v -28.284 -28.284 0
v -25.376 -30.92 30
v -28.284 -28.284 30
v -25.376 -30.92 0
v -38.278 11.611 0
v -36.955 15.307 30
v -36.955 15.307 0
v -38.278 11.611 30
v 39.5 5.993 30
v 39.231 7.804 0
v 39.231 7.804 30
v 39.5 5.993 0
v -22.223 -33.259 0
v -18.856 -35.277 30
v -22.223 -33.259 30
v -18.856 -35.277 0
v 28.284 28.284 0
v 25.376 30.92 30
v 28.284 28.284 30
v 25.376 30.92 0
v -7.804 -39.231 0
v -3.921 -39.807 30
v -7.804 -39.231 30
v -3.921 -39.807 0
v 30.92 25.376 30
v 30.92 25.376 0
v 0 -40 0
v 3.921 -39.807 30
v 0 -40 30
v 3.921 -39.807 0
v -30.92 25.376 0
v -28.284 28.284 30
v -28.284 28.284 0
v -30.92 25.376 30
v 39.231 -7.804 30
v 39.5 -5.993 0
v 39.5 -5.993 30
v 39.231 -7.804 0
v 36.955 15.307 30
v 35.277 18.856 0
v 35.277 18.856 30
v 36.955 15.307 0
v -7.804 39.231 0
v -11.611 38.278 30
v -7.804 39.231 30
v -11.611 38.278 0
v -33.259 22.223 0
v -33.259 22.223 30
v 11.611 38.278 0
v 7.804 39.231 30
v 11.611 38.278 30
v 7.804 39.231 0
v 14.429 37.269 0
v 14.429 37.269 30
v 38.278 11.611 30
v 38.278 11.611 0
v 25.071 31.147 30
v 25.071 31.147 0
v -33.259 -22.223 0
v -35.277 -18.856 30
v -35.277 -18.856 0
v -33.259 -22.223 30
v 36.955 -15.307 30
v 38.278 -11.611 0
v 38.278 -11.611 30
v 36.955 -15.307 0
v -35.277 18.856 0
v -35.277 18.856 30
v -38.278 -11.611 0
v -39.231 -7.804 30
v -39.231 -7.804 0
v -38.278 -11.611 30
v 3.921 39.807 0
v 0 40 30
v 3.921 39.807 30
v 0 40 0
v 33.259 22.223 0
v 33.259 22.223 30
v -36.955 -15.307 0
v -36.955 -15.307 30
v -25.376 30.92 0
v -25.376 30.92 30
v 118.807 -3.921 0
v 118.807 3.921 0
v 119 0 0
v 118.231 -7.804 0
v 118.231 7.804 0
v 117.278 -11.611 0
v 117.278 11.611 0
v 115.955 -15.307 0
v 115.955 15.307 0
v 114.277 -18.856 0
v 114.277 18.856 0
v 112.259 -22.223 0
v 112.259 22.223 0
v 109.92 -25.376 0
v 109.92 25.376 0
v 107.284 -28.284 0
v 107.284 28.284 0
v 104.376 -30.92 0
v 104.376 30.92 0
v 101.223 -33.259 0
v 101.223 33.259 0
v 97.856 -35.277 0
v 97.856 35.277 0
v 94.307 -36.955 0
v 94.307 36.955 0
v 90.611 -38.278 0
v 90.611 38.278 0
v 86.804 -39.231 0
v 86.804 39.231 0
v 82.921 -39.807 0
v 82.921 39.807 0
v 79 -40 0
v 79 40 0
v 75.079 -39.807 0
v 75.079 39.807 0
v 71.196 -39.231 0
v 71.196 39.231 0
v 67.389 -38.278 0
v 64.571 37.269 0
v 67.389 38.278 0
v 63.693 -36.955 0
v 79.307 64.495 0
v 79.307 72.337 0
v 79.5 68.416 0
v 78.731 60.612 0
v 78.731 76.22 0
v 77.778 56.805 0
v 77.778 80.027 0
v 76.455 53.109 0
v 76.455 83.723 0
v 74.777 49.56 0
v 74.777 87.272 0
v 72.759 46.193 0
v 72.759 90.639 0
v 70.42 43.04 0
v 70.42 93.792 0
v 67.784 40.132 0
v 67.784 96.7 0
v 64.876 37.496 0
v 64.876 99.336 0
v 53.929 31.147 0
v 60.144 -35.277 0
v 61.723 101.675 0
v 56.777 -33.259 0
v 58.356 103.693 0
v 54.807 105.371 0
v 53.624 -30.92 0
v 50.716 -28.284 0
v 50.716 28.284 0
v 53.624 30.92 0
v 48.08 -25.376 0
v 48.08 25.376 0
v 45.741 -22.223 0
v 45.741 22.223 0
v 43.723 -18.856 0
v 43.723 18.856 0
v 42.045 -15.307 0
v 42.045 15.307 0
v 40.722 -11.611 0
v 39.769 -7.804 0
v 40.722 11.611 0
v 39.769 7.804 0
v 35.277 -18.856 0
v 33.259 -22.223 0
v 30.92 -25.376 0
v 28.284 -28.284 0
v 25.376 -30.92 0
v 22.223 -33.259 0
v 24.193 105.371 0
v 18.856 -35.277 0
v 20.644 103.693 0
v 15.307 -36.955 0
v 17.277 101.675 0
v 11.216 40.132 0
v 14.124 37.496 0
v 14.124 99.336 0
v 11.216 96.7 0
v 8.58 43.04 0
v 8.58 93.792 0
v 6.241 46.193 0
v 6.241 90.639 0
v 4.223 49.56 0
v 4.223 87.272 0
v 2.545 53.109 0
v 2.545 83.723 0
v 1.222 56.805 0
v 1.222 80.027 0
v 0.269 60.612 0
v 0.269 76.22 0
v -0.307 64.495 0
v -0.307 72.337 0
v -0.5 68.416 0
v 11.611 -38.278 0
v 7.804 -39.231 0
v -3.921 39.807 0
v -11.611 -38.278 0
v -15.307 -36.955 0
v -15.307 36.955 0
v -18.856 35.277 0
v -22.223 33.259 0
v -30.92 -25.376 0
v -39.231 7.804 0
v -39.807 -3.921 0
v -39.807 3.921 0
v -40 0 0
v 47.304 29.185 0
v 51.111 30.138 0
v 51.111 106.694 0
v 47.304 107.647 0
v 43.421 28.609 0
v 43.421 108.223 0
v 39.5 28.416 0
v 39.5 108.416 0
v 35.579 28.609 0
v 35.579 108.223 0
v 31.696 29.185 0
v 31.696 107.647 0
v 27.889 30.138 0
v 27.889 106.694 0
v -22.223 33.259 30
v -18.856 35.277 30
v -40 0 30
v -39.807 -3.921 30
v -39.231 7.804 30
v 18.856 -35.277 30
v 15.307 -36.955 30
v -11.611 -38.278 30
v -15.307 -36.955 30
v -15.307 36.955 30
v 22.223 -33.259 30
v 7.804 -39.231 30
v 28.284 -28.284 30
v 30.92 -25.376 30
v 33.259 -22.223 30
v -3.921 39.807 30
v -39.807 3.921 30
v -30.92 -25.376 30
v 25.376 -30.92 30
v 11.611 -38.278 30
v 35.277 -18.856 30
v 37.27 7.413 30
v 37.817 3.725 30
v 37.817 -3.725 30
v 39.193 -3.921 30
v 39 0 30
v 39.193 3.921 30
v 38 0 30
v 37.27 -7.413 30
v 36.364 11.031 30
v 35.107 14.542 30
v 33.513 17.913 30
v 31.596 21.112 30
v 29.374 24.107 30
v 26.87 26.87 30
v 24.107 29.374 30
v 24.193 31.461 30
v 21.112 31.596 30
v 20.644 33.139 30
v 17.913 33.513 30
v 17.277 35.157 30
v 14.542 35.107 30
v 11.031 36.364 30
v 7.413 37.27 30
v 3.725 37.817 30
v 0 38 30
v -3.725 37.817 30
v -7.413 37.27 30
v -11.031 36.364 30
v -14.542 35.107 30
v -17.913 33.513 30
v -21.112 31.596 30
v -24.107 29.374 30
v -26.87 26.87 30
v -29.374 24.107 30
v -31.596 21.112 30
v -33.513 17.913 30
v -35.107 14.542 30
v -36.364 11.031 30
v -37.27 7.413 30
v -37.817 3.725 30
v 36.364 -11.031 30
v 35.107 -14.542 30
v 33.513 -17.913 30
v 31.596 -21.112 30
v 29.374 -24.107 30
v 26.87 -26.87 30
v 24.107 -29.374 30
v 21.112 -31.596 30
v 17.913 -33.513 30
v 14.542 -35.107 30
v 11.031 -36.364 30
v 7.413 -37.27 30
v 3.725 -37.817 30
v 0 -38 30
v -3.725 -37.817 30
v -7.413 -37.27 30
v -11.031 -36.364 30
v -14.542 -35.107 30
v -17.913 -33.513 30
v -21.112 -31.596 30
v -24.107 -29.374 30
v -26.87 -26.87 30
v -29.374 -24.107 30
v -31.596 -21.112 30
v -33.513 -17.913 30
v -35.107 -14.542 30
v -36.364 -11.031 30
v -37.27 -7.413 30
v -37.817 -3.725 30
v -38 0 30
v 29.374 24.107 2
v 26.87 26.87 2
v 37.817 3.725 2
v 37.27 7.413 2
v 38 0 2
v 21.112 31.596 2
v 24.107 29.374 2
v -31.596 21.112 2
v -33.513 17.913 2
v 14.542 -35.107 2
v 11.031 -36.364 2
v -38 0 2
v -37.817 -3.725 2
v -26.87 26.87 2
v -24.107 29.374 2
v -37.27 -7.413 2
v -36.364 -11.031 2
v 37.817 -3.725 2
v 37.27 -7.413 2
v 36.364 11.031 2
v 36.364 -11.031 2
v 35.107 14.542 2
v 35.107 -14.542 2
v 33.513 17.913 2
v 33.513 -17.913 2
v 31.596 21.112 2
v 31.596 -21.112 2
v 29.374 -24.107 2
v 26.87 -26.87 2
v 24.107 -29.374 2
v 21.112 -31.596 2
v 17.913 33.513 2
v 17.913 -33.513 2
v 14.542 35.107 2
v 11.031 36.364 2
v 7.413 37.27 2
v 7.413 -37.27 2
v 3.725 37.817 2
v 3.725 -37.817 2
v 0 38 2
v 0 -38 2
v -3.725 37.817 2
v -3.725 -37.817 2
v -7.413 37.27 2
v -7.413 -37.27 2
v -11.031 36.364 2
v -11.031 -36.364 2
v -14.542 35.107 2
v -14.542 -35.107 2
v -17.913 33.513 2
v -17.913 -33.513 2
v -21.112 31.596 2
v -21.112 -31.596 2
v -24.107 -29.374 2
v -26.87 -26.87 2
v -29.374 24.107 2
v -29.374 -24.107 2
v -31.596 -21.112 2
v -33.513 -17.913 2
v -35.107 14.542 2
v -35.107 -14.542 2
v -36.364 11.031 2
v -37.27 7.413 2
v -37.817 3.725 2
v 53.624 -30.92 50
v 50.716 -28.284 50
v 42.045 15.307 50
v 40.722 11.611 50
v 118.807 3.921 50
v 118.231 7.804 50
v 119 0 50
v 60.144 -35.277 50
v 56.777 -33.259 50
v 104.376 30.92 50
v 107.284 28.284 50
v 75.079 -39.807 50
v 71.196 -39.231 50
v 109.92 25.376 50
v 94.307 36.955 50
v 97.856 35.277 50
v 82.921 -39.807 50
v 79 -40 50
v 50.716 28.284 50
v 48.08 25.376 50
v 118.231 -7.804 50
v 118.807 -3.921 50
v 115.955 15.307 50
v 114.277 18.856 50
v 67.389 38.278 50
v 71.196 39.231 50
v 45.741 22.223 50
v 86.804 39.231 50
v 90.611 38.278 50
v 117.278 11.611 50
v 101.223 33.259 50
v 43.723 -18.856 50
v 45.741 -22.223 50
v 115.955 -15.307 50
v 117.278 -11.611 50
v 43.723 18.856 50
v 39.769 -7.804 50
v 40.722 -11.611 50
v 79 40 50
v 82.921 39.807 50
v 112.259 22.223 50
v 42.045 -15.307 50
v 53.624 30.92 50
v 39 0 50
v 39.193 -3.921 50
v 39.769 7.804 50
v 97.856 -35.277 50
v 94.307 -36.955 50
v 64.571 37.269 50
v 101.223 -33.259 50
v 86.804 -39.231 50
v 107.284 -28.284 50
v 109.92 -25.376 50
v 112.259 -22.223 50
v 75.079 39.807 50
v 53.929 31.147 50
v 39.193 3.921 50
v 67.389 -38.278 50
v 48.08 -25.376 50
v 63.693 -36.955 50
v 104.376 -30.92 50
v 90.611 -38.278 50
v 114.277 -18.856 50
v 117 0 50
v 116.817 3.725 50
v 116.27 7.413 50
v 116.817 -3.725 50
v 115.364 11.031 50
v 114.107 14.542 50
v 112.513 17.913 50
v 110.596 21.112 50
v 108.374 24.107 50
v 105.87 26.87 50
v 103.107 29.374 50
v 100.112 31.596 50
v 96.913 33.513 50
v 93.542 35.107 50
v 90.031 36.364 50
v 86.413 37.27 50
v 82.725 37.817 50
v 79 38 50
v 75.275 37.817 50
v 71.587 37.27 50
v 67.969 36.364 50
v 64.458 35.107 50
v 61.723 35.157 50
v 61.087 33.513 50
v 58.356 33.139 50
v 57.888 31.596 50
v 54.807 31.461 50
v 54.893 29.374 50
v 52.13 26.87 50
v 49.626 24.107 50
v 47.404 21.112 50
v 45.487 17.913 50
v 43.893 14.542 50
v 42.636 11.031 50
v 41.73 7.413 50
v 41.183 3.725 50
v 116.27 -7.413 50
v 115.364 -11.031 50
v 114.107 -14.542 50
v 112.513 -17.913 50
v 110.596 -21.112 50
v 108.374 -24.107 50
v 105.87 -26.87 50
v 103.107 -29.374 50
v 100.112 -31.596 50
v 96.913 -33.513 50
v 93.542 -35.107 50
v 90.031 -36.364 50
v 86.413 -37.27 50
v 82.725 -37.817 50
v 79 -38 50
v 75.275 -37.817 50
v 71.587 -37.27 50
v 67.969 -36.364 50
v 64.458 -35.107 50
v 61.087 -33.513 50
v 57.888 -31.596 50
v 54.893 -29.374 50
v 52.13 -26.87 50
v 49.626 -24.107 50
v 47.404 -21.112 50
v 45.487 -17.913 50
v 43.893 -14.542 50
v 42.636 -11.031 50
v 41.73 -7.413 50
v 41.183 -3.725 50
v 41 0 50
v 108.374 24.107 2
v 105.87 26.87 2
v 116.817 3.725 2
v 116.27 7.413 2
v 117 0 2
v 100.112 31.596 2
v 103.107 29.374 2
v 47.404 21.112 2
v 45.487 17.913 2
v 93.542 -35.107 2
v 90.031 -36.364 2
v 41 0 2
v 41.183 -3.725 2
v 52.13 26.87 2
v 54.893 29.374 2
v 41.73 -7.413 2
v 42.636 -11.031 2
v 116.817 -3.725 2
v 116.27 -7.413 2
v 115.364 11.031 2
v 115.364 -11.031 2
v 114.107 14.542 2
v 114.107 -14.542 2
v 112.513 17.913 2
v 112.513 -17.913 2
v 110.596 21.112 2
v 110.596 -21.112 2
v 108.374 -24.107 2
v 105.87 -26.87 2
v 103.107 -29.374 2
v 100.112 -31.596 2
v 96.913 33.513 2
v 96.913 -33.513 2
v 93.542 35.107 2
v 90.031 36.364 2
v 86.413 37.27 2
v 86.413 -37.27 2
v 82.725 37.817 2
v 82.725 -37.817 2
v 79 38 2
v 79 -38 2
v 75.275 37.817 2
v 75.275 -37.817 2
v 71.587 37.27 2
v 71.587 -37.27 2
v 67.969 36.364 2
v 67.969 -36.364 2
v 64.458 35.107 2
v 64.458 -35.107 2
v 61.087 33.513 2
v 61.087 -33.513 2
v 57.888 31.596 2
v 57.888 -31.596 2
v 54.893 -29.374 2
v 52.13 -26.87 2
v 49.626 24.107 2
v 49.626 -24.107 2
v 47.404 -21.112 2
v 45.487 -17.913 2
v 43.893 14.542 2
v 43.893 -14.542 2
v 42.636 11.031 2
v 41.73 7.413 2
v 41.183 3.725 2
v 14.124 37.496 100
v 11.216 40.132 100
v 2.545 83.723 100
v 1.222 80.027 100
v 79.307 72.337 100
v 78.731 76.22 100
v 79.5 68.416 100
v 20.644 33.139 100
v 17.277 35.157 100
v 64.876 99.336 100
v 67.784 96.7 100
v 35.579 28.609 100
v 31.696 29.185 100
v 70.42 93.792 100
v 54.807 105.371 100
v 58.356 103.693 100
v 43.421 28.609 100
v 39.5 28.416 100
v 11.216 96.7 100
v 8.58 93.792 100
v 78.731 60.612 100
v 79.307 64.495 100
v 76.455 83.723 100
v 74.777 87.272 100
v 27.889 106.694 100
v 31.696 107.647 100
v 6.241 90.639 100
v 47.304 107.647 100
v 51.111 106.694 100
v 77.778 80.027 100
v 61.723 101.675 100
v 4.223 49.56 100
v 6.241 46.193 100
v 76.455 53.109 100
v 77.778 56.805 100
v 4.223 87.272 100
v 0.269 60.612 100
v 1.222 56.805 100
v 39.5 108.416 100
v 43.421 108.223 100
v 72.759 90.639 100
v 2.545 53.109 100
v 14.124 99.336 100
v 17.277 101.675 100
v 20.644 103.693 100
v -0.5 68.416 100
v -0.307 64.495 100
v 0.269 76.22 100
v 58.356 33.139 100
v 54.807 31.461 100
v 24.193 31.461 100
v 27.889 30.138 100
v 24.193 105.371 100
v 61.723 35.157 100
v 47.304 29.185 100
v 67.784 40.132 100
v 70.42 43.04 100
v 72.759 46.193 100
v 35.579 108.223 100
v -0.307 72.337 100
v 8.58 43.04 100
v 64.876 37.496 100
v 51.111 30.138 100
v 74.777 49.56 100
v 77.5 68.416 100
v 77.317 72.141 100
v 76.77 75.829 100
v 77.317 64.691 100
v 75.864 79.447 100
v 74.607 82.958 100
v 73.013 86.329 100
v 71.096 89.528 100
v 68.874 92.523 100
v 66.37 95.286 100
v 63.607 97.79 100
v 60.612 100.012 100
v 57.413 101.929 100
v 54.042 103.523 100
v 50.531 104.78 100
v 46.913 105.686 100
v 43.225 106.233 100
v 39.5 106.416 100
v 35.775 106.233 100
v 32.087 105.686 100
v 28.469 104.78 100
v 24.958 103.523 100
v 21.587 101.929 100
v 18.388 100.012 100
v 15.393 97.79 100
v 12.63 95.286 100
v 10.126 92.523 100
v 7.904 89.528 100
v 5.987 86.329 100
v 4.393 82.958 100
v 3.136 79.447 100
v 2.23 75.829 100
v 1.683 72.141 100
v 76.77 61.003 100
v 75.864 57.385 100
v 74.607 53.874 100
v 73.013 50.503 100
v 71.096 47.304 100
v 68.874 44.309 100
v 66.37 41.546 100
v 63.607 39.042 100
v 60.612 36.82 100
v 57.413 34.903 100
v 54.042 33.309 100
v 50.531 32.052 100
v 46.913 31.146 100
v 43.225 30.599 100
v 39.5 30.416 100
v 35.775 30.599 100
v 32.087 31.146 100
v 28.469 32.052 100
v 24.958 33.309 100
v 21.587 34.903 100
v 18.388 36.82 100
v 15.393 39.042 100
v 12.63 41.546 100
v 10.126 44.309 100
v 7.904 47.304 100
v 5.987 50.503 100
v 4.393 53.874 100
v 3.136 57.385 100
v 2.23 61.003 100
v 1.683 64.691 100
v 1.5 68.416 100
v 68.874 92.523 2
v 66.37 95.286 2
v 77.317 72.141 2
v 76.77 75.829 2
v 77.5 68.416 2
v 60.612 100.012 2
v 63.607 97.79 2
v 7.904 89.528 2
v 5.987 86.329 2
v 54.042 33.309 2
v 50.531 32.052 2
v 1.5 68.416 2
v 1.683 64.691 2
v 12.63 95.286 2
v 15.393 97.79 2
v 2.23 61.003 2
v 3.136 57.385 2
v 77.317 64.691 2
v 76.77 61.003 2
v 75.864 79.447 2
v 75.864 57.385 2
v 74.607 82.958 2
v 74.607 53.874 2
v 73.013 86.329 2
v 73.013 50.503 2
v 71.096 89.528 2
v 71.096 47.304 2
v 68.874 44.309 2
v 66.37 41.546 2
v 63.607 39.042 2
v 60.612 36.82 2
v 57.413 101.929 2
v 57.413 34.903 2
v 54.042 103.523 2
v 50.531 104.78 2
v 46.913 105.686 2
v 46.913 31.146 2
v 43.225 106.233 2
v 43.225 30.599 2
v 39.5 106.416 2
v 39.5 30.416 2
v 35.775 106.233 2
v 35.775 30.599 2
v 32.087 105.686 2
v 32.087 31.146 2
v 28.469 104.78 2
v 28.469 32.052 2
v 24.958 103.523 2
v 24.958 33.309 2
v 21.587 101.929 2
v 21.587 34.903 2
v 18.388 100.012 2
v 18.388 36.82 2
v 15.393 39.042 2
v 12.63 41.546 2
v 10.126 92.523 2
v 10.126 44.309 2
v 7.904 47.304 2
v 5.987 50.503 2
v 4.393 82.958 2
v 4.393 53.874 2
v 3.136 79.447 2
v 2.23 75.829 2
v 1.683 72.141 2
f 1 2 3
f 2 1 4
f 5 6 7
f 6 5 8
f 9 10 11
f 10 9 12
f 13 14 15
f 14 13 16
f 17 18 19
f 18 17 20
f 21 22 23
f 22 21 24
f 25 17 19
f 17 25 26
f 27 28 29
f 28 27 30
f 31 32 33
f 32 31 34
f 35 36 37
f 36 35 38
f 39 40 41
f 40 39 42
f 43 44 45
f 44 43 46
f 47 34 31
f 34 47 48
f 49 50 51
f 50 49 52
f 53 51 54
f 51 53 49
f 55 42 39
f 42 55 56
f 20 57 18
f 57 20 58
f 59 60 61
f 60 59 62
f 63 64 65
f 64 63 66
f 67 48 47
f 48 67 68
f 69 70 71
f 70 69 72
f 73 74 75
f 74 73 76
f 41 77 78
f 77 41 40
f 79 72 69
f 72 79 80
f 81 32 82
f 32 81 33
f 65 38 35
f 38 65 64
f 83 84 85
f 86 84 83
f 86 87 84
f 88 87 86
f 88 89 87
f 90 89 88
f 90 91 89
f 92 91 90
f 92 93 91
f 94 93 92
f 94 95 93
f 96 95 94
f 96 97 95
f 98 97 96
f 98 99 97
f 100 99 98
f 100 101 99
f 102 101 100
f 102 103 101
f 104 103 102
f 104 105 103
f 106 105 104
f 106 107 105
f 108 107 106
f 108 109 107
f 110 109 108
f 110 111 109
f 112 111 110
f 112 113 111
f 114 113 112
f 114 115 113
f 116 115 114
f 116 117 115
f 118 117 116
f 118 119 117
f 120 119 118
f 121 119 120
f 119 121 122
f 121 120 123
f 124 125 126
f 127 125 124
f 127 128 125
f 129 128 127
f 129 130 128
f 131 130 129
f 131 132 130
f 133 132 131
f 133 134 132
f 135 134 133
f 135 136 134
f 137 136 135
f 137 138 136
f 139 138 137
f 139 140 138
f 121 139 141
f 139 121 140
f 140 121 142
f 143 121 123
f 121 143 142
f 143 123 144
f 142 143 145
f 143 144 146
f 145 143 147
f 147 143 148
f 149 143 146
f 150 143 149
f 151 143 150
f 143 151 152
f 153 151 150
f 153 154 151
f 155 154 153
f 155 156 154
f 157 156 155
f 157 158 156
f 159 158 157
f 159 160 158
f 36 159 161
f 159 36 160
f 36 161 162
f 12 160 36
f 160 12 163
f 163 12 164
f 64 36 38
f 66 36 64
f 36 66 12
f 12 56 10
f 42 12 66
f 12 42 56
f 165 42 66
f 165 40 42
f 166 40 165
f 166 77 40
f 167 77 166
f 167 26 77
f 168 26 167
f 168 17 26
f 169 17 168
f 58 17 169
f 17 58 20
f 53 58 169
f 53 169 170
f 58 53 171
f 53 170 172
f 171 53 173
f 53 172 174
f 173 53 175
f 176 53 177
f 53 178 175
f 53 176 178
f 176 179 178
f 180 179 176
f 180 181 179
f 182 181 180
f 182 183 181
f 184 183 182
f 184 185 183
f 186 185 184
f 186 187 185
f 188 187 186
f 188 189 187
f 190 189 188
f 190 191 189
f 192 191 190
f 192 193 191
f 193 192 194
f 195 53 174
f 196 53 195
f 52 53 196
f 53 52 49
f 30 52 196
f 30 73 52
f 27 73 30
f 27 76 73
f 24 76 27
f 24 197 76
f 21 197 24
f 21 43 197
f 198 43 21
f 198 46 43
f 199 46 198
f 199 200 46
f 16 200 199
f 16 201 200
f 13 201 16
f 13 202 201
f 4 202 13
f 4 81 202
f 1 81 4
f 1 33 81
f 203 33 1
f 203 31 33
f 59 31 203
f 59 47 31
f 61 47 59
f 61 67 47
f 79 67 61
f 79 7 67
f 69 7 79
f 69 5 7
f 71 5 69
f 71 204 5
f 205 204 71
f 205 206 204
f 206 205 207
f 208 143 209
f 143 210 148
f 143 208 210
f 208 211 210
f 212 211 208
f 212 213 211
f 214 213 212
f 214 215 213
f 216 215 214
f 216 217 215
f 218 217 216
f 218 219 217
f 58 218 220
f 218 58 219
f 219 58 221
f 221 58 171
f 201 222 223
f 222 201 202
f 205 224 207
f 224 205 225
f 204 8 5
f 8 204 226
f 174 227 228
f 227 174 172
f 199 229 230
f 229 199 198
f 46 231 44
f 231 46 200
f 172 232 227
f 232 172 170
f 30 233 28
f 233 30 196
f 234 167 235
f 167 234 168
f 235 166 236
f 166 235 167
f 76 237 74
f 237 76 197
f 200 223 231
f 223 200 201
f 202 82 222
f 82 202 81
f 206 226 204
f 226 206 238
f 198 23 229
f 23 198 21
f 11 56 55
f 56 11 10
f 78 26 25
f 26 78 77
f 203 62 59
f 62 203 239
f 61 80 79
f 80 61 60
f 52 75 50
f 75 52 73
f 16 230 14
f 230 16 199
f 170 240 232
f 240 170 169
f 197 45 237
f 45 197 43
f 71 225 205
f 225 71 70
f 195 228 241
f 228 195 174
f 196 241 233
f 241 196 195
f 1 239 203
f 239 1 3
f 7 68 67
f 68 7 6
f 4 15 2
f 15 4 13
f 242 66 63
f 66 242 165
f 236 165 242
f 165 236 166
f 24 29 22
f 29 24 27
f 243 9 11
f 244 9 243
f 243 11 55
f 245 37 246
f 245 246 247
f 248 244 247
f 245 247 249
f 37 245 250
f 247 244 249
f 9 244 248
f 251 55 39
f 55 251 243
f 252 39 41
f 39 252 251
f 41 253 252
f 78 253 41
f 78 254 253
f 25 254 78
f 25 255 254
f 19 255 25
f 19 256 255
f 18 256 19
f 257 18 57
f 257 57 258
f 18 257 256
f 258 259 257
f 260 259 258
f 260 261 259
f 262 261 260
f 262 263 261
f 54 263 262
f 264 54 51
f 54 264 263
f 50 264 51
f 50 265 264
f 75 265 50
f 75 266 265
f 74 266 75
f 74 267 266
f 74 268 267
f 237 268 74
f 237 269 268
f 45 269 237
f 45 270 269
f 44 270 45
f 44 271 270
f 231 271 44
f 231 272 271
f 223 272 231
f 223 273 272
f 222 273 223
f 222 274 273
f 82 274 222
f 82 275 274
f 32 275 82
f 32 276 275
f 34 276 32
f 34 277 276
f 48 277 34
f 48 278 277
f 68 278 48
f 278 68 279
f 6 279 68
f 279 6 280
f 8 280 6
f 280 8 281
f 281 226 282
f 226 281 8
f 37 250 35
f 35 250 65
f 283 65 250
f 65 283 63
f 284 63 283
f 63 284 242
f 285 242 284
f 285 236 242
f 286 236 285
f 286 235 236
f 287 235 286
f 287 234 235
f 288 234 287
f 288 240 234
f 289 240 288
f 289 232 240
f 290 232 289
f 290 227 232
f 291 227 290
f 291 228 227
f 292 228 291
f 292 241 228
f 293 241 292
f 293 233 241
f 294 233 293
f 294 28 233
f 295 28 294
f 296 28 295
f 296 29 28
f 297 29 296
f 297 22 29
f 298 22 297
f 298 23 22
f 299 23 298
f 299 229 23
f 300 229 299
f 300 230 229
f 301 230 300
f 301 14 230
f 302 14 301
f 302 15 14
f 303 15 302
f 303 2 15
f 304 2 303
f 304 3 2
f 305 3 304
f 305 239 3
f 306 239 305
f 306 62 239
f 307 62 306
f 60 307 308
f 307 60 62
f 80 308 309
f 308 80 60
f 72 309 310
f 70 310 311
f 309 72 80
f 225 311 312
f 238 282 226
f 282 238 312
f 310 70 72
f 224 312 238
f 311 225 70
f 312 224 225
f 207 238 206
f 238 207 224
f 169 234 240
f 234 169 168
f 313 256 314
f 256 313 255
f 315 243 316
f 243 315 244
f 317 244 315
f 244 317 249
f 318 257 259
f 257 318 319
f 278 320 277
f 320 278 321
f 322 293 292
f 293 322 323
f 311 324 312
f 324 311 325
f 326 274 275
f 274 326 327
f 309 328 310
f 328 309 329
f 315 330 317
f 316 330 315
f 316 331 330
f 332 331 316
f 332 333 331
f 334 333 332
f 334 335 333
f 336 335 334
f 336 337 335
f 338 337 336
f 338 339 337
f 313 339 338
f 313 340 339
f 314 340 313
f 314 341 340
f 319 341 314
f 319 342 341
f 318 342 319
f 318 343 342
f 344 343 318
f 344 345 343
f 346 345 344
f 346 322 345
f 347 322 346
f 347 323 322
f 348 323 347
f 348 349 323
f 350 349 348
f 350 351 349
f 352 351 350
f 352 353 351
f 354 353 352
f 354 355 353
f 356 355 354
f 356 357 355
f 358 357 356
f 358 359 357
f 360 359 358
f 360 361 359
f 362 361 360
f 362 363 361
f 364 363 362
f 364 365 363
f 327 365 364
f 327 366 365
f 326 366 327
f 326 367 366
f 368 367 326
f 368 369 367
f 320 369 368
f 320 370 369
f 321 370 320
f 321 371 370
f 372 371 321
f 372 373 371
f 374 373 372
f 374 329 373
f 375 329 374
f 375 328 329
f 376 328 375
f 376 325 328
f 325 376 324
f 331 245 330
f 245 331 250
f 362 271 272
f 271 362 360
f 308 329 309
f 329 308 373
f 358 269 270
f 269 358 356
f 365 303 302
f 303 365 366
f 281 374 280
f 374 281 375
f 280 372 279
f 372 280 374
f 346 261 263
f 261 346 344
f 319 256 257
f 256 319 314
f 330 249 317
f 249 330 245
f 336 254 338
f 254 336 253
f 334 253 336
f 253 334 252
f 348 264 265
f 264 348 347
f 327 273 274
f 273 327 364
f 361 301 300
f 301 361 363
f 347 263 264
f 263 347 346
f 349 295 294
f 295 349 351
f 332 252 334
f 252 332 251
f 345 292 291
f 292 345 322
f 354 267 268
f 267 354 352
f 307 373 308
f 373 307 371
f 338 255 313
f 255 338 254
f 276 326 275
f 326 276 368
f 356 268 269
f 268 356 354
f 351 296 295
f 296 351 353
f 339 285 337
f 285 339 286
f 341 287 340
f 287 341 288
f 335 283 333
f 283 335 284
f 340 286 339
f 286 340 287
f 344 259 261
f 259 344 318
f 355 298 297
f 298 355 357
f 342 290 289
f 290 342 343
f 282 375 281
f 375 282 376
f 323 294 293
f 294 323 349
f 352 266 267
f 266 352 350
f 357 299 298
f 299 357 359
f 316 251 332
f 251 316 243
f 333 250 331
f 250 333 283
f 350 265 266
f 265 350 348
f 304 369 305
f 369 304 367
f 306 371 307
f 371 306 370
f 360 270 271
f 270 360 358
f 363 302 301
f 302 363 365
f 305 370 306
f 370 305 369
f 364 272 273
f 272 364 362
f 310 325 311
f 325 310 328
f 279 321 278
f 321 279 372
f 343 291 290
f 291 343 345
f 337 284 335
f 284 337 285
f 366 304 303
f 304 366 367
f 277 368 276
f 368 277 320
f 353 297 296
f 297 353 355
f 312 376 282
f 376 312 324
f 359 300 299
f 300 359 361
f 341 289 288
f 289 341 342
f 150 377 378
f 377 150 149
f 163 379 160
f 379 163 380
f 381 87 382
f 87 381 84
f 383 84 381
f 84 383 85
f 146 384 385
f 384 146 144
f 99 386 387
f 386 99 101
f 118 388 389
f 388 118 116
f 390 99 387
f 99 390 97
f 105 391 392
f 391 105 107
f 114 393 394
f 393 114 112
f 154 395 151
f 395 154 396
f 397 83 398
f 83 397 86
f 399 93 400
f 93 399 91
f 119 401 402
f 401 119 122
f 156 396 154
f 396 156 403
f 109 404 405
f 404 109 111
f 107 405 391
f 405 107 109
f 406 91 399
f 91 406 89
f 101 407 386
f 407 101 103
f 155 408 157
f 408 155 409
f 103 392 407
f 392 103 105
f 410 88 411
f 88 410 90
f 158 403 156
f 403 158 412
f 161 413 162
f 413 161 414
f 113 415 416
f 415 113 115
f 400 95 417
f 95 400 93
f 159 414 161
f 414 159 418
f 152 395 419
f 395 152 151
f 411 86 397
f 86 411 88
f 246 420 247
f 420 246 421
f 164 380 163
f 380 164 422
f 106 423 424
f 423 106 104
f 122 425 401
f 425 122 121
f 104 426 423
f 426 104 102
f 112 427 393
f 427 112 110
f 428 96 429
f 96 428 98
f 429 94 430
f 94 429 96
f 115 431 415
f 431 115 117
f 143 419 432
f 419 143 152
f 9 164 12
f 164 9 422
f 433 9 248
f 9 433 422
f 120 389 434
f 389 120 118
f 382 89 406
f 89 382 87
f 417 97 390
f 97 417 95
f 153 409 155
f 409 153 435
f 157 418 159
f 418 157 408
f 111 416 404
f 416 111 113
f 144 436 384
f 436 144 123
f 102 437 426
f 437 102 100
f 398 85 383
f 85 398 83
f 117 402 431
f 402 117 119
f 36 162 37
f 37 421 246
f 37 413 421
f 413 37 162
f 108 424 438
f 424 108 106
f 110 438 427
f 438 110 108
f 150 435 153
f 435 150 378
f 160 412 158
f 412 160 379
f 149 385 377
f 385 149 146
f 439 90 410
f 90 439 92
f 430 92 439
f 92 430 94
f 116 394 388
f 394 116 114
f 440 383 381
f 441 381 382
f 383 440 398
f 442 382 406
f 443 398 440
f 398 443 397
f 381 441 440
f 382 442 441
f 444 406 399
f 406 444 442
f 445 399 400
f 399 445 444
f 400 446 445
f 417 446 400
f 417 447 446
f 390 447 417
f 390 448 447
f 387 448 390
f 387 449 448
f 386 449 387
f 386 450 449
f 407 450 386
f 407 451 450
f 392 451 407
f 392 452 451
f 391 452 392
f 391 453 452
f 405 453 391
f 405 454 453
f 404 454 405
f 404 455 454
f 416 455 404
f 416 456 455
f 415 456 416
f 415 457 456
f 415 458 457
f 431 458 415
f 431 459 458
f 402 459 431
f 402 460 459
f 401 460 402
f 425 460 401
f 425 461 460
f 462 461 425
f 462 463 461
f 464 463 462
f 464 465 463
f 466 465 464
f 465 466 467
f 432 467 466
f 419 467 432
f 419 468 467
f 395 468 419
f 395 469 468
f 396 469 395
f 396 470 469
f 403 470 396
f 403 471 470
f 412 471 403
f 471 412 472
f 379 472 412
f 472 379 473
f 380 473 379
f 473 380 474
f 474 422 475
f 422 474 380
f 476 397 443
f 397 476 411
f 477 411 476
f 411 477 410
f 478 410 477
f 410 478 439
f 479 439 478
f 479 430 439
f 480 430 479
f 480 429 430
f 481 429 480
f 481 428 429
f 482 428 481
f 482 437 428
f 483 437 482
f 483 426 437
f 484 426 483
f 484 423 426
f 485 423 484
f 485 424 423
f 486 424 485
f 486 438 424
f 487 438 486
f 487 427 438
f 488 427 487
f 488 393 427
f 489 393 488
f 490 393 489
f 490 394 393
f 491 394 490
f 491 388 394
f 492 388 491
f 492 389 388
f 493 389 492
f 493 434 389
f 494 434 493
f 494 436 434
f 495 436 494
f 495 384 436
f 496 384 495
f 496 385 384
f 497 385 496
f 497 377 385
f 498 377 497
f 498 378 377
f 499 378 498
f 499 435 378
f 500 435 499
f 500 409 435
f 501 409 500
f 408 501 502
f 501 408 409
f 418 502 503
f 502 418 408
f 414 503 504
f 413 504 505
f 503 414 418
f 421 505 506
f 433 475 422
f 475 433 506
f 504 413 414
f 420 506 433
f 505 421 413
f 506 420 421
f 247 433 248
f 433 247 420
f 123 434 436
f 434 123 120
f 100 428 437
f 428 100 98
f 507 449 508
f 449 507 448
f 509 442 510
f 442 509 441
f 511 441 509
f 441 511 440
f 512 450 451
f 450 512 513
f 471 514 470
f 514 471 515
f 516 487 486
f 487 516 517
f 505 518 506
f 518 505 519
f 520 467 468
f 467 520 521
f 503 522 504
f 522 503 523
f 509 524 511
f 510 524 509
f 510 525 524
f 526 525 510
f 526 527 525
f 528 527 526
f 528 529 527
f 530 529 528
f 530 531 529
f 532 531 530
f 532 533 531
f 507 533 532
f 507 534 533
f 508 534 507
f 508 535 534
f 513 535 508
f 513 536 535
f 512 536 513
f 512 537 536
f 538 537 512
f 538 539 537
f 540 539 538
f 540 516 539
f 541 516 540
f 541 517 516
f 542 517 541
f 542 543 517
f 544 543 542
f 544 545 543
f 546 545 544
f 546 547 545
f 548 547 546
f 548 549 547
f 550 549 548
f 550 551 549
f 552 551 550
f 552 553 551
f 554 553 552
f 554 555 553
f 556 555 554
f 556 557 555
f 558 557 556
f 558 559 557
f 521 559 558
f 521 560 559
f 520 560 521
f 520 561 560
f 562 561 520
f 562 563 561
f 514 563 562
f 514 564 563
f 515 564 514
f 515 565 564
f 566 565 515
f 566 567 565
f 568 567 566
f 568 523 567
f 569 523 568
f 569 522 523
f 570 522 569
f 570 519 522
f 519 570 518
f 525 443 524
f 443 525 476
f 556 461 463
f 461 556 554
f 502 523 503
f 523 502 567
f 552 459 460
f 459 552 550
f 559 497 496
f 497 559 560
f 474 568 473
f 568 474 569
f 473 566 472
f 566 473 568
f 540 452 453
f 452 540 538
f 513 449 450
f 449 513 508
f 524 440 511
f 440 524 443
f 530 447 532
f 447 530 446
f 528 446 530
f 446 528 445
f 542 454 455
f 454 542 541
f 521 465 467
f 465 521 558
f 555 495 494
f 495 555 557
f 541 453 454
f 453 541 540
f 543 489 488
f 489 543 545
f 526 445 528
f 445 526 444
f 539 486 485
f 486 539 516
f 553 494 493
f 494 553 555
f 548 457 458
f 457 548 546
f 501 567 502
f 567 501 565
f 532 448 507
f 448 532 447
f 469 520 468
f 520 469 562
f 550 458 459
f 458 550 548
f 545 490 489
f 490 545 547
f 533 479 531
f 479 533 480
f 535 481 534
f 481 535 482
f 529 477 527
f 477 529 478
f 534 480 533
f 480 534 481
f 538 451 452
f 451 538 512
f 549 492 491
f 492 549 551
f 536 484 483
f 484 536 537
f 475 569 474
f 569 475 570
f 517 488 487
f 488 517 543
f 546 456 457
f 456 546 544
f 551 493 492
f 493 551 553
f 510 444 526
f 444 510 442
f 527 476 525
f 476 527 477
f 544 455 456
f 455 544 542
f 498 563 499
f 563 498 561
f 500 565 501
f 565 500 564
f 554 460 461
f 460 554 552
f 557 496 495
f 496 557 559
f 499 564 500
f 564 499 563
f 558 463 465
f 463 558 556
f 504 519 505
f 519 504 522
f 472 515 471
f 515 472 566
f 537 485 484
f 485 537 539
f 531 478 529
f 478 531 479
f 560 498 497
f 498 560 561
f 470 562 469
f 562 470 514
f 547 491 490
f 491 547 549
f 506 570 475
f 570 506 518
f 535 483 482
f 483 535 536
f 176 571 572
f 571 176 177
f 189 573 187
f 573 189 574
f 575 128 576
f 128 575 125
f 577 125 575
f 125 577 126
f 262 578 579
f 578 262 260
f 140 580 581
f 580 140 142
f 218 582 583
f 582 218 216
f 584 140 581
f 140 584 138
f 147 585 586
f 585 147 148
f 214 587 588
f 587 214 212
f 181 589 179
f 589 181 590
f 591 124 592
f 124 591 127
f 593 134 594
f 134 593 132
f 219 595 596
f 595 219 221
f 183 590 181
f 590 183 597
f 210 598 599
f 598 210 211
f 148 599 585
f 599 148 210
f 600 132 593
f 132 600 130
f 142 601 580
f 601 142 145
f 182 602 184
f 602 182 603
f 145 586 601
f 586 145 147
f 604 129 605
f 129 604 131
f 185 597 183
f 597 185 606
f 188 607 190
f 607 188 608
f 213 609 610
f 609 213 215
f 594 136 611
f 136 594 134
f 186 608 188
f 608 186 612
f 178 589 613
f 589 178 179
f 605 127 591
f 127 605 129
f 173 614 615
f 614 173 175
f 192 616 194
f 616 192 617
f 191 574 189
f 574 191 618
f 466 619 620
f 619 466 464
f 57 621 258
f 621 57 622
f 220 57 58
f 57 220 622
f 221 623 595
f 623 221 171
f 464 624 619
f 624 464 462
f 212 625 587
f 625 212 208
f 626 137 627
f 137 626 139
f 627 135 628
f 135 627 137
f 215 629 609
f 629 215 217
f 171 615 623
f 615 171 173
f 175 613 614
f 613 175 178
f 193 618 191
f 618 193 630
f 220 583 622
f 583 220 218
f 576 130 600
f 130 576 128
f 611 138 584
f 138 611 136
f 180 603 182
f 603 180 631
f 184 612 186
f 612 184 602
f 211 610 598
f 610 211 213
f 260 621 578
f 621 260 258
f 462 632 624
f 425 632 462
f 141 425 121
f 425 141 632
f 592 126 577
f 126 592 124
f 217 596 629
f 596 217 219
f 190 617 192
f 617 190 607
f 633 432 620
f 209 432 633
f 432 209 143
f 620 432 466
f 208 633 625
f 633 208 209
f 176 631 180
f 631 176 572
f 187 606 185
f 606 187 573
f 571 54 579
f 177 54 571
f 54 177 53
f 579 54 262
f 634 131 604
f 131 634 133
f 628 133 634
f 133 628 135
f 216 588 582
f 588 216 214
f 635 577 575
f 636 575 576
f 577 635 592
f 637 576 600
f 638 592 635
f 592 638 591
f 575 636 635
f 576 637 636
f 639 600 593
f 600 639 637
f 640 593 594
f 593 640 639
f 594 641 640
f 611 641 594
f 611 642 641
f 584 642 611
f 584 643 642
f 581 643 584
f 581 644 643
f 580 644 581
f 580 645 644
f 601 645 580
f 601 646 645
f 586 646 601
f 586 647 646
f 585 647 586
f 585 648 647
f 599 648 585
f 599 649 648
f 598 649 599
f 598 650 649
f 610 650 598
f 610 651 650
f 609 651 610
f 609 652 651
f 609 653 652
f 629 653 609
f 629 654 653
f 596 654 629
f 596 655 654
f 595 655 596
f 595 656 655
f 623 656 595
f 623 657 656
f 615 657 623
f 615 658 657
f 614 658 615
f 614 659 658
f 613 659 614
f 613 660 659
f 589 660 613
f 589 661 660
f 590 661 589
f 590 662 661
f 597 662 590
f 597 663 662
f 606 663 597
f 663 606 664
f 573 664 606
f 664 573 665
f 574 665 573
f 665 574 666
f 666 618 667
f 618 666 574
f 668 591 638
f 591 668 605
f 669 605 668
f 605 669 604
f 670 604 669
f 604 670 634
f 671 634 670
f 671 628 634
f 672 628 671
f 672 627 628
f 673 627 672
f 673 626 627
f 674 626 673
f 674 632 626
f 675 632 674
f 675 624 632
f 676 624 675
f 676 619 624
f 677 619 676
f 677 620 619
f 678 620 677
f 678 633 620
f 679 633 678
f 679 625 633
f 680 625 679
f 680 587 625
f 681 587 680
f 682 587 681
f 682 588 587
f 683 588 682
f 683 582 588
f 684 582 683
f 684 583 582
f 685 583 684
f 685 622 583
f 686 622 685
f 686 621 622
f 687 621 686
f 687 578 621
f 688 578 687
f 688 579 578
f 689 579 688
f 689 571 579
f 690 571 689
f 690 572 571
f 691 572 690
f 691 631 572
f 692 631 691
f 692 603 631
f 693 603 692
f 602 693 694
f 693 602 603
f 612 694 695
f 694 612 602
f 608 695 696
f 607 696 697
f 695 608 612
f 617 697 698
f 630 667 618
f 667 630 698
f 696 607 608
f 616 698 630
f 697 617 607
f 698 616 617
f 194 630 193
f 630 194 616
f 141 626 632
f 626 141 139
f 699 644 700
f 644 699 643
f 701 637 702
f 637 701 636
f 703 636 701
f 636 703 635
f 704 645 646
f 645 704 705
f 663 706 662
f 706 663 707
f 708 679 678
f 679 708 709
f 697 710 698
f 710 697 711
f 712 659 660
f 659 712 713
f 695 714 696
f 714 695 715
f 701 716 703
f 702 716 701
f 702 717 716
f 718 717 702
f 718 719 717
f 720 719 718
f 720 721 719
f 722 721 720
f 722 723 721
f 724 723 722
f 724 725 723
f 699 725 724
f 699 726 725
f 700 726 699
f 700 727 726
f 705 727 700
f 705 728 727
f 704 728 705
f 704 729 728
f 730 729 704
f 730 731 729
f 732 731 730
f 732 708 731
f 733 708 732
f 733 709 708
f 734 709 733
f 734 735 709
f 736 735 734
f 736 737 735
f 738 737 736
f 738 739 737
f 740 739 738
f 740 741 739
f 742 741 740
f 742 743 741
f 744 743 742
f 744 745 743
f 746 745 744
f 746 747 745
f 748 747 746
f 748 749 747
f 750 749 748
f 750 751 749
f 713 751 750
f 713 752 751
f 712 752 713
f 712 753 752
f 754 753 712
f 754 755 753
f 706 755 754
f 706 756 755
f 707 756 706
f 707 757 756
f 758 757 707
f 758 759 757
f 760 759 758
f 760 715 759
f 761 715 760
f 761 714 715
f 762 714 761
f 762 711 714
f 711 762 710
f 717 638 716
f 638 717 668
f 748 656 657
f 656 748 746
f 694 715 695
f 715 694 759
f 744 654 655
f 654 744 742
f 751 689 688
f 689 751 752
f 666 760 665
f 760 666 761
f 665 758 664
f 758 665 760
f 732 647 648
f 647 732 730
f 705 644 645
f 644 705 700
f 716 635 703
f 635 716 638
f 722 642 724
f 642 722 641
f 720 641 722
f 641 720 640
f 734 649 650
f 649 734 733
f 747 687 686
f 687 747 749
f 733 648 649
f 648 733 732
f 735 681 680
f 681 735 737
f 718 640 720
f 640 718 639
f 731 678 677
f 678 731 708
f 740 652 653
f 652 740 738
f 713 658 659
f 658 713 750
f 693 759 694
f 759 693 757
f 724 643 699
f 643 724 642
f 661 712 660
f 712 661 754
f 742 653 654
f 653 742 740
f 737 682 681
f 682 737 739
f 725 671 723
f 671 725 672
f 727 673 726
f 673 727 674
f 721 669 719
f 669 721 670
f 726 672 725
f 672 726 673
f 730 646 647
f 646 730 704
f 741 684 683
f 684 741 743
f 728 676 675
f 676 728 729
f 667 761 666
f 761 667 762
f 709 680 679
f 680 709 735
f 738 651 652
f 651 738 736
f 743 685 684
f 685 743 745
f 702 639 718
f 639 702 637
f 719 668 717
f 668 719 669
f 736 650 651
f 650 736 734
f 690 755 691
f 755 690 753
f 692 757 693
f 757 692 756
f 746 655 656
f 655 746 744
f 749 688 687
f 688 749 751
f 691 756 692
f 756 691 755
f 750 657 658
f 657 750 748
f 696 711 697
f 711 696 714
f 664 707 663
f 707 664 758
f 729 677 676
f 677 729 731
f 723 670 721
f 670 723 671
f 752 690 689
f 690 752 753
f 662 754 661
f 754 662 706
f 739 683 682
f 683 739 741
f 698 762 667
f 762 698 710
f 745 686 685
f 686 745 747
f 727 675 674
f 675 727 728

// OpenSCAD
diameter = 80;
h1 = 30; 
h2 = 50;
h3 = 100;

module Container(height) {
  $fn=64;
  difference() {
    cylinder(h = height, d=diameter);
    translate([0, 0, 2]) {
      cylinder(h=height, d=diameter-4);
    }
  }
}

module PencilHolder(h1=100, h2=50, h3=40) {
  Container(h1);
  translate([diameter - 1, 0, 0]) {
    Container(h2);
  }
  translate([(diameter-1)/2, (diameter-1)*sin(60), 0]) {
    Container(h3);
  }
}

PencilHolder(h1, h2, h3);
